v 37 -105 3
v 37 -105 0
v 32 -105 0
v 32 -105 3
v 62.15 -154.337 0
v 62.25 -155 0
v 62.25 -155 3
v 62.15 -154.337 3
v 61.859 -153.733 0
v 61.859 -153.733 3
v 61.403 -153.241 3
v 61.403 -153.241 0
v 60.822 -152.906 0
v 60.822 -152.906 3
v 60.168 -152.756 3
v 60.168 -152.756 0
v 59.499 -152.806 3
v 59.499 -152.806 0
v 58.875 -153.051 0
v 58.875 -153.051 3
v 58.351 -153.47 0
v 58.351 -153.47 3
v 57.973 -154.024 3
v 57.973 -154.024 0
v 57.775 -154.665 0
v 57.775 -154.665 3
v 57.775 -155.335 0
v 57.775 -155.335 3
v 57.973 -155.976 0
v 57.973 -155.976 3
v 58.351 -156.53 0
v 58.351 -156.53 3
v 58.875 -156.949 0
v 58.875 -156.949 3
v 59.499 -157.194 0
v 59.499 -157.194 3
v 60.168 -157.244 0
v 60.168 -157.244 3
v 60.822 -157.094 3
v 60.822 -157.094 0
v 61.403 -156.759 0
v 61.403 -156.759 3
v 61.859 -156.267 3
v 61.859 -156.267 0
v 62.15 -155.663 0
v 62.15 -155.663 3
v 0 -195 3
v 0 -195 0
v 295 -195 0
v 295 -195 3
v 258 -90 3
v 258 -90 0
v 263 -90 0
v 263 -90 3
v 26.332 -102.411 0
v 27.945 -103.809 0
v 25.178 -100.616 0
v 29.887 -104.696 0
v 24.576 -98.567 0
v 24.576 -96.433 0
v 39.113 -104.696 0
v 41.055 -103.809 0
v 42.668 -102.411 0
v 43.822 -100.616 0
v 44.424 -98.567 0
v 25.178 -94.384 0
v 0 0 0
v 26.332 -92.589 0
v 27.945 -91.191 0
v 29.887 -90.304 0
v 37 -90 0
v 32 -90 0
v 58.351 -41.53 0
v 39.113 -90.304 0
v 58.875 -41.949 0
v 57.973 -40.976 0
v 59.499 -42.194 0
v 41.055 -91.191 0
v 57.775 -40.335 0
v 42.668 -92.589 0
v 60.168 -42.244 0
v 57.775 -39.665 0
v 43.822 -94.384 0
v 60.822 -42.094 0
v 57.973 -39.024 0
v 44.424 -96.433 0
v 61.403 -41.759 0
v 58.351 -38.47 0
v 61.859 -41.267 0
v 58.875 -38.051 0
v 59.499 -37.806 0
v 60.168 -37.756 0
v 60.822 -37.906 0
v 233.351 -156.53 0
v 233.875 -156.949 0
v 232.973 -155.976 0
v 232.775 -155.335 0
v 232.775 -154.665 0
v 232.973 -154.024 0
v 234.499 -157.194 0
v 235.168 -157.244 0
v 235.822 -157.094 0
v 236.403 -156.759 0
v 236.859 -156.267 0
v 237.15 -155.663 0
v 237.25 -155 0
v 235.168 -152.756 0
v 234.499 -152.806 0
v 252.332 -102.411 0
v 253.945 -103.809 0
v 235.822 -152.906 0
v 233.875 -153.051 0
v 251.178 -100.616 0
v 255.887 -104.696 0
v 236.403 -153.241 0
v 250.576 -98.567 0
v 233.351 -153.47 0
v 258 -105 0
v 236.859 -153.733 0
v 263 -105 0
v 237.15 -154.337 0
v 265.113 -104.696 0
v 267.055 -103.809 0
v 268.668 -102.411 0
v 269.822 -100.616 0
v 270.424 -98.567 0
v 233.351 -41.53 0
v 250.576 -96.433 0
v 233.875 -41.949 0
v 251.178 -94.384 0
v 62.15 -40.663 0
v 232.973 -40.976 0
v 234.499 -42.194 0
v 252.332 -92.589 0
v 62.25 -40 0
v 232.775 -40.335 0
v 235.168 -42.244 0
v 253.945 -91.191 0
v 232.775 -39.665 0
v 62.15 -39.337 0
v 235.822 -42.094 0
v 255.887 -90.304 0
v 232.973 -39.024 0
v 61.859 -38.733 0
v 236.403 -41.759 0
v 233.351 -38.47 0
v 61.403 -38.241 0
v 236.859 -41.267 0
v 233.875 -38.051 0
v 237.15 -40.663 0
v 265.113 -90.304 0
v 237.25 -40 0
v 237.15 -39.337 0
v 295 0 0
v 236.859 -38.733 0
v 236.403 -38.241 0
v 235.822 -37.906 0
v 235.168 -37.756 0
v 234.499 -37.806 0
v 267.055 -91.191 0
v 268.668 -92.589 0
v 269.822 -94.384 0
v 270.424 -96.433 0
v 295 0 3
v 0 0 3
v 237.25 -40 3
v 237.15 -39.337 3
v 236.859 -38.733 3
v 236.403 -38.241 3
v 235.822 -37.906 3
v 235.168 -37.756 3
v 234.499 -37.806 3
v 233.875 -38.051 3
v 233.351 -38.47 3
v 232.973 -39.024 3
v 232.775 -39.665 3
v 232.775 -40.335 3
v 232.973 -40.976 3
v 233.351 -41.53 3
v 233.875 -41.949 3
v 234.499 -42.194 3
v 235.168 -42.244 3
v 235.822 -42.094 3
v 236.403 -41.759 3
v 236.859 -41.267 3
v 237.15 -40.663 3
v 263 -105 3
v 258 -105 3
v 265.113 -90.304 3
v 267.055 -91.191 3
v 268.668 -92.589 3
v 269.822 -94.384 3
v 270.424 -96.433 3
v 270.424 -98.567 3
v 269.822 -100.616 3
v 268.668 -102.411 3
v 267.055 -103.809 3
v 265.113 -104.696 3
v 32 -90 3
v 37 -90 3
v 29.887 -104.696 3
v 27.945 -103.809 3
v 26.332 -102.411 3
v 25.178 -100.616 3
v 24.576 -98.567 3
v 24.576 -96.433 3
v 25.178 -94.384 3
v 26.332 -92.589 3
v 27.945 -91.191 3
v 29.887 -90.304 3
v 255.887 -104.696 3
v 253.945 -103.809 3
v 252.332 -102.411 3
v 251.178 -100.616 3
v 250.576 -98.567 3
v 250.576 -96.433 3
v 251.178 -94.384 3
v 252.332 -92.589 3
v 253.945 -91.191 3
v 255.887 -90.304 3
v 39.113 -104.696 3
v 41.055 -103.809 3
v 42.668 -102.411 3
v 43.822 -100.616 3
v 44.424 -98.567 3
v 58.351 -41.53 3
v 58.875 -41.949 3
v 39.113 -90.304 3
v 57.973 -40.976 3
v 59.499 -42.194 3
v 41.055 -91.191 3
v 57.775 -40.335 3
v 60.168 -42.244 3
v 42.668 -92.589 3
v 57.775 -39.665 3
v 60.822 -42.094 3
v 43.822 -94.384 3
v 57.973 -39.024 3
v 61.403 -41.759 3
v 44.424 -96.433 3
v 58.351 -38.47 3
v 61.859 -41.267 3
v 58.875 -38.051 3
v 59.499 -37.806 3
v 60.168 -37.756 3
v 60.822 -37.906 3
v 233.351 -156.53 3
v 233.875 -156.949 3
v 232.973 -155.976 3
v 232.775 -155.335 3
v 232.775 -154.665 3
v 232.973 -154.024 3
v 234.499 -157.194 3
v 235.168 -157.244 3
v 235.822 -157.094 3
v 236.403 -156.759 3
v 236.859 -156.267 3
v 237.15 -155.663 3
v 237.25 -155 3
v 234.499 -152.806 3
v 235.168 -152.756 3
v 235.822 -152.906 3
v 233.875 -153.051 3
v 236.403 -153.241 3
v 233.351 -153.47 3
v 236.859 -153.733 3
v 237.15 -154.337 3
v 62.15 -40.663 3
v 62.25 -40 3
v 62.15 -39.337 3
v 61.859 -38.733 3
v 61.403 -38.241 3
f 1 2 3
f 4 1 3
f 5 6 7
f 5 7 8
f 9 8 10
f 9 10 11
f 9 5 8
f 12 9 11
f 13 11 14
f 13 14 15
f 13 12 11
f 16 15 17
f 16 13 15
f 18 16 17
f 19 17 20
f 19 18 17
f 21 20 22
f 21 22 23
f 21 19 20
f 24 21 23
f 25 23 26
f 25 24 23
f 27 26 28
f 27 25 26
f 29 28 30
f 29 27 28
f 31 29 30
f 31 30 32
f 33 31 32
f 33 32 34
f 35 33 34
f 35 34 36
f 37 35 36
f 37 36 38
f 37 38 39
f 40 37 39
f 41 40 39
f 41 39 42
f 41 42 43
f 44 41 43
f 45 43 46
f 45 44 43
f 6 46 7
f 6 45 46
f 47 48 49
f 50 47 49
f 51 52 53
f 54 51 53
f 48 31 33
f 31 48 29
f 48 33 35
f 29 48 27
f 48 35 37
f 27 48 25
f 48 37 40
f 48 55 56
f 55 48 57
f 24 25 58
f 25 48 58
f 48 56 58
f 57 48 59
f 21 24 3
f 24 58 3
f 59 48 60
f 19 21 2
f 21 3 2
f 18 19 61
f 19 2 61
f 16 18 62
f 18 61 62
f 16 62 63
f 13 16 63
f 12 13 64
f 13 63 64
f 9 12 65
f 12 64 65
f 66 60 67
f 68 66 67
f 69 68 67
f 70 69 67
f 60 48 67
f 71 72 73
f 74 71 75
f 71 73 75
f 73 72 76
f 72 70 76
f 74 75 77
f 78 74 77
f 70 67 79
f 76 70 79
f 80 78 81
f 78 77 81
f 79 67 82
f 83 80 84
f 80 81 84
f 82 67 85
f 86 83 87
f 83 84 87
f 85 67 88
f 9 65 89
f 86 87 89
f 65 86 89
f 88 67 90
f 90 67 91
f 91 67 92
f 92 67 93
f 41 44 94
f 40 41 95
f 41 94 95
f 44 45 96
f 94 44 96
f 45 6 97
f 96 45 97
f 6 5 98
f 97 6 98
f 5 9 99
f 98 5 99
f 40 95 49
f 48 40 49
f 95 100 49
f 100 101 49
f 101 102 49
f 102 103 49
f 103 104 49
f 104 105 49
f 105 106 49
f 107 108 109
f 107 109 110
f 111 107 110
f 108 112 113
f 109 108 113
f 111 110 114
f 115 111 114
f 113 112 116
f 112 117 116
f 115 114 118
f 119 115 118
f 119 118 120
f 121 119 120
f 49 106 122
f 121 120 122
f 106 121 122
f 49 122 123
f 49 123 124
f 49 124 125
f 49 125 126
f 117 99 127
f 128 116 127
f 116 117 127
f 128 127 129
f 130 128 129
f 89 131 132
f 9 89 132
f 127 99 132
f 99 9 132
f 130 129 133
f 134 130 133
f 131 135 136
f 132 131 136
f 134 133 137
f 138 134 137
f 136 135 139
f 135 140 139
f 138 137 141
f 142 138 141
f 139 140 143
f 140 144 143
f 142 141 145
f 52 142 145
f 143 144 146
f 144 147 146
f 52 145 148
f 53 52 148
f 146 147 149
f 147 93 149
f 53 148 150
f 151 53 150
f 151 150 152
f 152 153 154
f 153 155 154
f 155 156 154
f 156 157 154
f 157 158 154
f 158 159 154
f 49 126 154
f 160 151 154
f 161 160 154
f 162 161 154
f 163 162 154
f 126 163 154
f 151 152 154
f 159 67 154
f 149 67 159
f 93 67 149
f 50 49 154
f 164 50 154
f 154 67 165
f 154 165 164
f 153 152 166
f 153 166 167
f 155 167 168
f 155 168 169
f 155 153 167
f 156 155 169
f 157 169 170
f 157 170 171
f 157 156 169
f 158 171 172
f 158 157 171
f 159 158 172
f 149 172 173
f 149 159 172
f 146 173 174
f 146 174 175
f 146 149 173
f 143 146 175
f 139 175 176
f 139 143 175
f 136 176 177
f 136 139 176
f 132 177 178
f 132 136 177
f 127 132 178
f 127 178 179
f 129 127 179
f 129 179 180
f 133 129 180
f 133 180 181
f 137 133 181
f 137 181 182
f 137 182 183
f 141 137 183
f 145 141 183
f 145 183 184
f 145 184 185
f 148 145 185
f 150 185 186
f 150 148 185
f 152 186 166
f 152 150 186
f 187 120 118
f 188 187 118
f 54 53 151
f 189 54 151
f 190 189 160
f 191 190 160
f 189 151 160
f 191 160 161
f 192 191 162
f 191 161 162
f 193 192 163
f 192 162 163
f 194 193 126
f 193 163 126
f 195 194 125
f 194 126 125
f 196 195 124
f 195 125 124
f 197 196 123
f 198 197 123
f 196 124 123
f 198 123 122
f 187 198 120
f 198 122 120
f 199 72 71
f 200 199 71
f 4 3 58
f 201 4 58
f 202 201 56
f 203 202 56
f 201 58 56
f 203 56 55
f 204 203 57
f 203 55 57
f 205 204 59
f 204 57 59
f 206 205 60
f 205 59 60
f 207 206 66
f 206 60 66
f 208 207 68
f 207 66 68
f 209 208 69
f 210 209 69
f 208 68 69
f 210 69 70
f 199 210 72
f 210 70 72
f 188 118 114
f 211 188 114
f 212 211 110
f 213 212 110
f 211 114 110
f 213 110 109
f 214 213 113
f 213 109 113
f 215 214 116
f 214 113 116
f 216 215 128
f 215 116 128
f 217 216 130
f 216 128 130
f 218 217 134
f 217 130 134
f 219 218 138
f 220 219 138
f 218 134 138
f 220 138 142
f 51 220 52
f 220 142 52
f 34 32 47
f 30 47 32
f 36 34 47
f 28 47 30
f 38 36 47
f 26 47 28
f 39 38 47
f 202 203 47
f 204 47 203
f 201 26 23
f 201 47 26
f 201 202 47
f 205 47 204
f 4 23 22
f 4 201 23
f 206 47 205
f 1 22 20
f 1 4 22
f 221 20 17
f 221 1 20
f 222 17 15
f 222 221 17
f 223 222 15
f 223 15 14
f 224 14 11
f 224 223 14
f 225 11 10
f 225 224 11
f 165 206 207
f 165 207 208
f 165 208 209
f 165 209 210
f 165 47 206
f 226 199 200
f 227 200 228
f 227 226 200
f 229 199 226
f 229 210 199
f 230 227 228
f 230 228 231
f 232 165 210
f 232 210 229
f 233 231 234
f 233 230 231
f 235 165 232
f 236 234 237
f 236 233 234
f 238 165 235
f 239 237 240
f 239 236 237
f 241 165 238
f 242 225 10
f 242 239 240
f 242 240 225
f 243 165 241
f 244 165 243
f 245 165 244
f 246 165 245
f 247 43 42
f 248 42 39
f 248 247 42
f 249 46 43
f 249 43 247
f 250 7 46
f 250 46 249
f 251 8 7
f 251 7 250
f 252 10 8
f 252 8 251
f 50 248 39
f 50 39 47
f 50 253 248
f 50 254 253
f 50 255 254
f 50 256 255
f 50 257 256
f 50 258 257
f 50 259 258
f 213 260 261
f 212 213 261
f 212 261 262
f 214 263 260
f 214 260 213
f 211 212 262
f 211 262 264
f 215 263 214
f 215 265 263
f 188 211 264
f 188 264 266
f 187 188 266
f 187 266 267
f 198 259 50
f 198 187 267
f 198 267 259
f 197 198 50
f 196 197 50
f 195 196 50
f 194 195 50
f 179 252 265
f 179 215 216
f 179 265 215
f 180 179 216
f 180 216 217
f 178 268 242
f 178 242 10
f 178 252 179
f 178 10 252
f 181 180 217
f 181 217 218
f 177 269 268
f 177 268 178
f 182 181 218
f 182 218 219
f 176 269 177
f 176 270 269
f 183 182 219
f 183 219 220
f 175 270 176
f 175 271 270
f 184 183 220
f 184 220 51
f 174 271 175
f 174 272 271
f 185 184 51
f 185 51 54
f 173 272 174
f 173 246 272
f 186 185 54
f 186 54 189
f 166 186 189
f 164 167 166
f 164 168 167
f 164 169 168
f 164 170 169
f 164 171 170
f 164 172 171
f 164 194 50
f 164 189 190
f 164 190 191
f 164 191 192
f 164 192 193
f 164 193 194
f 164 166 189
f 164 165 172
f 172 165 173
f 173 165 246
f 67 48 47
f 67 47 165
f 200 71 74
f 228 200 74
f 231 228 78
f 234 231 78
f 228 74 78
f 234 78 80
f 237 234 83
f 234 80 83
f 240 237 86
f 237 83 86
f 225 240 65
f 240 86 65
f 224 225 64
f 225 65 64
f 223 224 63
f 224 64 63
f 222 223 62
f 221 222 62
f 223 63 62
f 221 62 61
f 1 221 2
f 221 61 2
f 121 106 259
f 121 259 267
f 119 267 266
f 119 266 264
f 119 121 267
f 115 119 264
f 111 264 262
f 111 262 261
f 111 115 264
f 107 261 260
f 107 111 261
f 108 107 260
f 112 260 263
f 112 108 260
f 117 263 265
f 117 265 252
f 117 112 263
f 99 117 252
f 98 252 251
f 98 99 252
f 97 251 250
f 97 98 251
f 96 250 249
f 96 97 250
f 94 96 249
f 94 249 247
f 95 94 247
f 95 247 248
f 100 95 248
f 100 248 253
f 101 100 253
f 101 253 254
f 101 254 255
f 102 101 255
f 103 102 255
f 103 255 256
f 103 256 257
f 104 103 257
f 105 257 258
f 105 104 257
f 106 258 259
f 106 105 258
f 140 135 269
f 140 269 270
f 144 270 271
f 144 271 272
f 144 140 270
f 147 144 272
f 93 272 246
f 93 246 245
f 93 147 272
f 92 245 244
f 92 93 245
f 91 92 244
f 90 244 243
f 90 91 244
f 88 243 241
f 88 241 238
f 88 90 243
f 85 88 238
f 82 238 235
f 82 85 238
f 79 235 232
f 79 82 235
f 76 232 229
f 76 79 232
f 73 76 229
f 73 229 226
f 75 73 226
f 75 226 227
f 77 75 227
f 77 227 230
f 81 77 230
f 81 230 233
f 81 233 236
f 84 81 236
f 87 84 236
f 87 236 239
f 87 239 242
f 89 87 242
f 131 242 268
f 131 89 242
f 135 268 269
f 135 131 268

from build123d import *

# Parameters (mm, degrees)
ESQUISSE1_W        = 295
ESQUISSE1_H        = 195
ESQUISSE1_R        = 2.25
BOSS_EXTRU_1_DEPTH = 3


with BuildPart() as part:
    # Esquisse1 → Boss.-Extru.1 (new body)
    with BuildSketch(Plane.XY):
        with Locations((147.5, -97.5)):
            Rectangle(ESQUISSE1_W, ESQUISSE1_H)
        with Locations((60, -40)):
            Circle(ESQUISSE1_R, mode=Mode.SUBTRACT)
        with Locations((235, -40)):
            Circle(ESQUISSE1_R, mode=Mode.SUBTRACT)
        with Locations((235, -155)):
            Circle(ESQUISSE1_R, mode=Mode.SUBTRACT)
        with Locations((60, -155)):
            Circle(ESQUISSE1_R, mode=Mode.SUBTRACT)
        with BuildLine():
            Line((32, -90), (37, -90))
            ThreePointArc((37, -90), (44.5, -97.5), (37, -105))
            Line((37, -105), (32, -105))
            ThreePointArc((32, -105), (24.5, -97.5), (32, -90))
        make_face(mode=Mode.SUBTRACT)
        with BuildLine():
            Line((263, -105), (258, -105))
            ThreePointArc((258, -105), (250.5, -97.5), (258, -90))
            Line((258, -90), (263, -90))
            ThreePointArc((263, -90), (270.5, -97.5), (263, -105))
        make_face(mode=Mode.SUBTRACT)
    extrude(amount=BOSS_EXTRU_1_DEPTH)


solid = part.part
